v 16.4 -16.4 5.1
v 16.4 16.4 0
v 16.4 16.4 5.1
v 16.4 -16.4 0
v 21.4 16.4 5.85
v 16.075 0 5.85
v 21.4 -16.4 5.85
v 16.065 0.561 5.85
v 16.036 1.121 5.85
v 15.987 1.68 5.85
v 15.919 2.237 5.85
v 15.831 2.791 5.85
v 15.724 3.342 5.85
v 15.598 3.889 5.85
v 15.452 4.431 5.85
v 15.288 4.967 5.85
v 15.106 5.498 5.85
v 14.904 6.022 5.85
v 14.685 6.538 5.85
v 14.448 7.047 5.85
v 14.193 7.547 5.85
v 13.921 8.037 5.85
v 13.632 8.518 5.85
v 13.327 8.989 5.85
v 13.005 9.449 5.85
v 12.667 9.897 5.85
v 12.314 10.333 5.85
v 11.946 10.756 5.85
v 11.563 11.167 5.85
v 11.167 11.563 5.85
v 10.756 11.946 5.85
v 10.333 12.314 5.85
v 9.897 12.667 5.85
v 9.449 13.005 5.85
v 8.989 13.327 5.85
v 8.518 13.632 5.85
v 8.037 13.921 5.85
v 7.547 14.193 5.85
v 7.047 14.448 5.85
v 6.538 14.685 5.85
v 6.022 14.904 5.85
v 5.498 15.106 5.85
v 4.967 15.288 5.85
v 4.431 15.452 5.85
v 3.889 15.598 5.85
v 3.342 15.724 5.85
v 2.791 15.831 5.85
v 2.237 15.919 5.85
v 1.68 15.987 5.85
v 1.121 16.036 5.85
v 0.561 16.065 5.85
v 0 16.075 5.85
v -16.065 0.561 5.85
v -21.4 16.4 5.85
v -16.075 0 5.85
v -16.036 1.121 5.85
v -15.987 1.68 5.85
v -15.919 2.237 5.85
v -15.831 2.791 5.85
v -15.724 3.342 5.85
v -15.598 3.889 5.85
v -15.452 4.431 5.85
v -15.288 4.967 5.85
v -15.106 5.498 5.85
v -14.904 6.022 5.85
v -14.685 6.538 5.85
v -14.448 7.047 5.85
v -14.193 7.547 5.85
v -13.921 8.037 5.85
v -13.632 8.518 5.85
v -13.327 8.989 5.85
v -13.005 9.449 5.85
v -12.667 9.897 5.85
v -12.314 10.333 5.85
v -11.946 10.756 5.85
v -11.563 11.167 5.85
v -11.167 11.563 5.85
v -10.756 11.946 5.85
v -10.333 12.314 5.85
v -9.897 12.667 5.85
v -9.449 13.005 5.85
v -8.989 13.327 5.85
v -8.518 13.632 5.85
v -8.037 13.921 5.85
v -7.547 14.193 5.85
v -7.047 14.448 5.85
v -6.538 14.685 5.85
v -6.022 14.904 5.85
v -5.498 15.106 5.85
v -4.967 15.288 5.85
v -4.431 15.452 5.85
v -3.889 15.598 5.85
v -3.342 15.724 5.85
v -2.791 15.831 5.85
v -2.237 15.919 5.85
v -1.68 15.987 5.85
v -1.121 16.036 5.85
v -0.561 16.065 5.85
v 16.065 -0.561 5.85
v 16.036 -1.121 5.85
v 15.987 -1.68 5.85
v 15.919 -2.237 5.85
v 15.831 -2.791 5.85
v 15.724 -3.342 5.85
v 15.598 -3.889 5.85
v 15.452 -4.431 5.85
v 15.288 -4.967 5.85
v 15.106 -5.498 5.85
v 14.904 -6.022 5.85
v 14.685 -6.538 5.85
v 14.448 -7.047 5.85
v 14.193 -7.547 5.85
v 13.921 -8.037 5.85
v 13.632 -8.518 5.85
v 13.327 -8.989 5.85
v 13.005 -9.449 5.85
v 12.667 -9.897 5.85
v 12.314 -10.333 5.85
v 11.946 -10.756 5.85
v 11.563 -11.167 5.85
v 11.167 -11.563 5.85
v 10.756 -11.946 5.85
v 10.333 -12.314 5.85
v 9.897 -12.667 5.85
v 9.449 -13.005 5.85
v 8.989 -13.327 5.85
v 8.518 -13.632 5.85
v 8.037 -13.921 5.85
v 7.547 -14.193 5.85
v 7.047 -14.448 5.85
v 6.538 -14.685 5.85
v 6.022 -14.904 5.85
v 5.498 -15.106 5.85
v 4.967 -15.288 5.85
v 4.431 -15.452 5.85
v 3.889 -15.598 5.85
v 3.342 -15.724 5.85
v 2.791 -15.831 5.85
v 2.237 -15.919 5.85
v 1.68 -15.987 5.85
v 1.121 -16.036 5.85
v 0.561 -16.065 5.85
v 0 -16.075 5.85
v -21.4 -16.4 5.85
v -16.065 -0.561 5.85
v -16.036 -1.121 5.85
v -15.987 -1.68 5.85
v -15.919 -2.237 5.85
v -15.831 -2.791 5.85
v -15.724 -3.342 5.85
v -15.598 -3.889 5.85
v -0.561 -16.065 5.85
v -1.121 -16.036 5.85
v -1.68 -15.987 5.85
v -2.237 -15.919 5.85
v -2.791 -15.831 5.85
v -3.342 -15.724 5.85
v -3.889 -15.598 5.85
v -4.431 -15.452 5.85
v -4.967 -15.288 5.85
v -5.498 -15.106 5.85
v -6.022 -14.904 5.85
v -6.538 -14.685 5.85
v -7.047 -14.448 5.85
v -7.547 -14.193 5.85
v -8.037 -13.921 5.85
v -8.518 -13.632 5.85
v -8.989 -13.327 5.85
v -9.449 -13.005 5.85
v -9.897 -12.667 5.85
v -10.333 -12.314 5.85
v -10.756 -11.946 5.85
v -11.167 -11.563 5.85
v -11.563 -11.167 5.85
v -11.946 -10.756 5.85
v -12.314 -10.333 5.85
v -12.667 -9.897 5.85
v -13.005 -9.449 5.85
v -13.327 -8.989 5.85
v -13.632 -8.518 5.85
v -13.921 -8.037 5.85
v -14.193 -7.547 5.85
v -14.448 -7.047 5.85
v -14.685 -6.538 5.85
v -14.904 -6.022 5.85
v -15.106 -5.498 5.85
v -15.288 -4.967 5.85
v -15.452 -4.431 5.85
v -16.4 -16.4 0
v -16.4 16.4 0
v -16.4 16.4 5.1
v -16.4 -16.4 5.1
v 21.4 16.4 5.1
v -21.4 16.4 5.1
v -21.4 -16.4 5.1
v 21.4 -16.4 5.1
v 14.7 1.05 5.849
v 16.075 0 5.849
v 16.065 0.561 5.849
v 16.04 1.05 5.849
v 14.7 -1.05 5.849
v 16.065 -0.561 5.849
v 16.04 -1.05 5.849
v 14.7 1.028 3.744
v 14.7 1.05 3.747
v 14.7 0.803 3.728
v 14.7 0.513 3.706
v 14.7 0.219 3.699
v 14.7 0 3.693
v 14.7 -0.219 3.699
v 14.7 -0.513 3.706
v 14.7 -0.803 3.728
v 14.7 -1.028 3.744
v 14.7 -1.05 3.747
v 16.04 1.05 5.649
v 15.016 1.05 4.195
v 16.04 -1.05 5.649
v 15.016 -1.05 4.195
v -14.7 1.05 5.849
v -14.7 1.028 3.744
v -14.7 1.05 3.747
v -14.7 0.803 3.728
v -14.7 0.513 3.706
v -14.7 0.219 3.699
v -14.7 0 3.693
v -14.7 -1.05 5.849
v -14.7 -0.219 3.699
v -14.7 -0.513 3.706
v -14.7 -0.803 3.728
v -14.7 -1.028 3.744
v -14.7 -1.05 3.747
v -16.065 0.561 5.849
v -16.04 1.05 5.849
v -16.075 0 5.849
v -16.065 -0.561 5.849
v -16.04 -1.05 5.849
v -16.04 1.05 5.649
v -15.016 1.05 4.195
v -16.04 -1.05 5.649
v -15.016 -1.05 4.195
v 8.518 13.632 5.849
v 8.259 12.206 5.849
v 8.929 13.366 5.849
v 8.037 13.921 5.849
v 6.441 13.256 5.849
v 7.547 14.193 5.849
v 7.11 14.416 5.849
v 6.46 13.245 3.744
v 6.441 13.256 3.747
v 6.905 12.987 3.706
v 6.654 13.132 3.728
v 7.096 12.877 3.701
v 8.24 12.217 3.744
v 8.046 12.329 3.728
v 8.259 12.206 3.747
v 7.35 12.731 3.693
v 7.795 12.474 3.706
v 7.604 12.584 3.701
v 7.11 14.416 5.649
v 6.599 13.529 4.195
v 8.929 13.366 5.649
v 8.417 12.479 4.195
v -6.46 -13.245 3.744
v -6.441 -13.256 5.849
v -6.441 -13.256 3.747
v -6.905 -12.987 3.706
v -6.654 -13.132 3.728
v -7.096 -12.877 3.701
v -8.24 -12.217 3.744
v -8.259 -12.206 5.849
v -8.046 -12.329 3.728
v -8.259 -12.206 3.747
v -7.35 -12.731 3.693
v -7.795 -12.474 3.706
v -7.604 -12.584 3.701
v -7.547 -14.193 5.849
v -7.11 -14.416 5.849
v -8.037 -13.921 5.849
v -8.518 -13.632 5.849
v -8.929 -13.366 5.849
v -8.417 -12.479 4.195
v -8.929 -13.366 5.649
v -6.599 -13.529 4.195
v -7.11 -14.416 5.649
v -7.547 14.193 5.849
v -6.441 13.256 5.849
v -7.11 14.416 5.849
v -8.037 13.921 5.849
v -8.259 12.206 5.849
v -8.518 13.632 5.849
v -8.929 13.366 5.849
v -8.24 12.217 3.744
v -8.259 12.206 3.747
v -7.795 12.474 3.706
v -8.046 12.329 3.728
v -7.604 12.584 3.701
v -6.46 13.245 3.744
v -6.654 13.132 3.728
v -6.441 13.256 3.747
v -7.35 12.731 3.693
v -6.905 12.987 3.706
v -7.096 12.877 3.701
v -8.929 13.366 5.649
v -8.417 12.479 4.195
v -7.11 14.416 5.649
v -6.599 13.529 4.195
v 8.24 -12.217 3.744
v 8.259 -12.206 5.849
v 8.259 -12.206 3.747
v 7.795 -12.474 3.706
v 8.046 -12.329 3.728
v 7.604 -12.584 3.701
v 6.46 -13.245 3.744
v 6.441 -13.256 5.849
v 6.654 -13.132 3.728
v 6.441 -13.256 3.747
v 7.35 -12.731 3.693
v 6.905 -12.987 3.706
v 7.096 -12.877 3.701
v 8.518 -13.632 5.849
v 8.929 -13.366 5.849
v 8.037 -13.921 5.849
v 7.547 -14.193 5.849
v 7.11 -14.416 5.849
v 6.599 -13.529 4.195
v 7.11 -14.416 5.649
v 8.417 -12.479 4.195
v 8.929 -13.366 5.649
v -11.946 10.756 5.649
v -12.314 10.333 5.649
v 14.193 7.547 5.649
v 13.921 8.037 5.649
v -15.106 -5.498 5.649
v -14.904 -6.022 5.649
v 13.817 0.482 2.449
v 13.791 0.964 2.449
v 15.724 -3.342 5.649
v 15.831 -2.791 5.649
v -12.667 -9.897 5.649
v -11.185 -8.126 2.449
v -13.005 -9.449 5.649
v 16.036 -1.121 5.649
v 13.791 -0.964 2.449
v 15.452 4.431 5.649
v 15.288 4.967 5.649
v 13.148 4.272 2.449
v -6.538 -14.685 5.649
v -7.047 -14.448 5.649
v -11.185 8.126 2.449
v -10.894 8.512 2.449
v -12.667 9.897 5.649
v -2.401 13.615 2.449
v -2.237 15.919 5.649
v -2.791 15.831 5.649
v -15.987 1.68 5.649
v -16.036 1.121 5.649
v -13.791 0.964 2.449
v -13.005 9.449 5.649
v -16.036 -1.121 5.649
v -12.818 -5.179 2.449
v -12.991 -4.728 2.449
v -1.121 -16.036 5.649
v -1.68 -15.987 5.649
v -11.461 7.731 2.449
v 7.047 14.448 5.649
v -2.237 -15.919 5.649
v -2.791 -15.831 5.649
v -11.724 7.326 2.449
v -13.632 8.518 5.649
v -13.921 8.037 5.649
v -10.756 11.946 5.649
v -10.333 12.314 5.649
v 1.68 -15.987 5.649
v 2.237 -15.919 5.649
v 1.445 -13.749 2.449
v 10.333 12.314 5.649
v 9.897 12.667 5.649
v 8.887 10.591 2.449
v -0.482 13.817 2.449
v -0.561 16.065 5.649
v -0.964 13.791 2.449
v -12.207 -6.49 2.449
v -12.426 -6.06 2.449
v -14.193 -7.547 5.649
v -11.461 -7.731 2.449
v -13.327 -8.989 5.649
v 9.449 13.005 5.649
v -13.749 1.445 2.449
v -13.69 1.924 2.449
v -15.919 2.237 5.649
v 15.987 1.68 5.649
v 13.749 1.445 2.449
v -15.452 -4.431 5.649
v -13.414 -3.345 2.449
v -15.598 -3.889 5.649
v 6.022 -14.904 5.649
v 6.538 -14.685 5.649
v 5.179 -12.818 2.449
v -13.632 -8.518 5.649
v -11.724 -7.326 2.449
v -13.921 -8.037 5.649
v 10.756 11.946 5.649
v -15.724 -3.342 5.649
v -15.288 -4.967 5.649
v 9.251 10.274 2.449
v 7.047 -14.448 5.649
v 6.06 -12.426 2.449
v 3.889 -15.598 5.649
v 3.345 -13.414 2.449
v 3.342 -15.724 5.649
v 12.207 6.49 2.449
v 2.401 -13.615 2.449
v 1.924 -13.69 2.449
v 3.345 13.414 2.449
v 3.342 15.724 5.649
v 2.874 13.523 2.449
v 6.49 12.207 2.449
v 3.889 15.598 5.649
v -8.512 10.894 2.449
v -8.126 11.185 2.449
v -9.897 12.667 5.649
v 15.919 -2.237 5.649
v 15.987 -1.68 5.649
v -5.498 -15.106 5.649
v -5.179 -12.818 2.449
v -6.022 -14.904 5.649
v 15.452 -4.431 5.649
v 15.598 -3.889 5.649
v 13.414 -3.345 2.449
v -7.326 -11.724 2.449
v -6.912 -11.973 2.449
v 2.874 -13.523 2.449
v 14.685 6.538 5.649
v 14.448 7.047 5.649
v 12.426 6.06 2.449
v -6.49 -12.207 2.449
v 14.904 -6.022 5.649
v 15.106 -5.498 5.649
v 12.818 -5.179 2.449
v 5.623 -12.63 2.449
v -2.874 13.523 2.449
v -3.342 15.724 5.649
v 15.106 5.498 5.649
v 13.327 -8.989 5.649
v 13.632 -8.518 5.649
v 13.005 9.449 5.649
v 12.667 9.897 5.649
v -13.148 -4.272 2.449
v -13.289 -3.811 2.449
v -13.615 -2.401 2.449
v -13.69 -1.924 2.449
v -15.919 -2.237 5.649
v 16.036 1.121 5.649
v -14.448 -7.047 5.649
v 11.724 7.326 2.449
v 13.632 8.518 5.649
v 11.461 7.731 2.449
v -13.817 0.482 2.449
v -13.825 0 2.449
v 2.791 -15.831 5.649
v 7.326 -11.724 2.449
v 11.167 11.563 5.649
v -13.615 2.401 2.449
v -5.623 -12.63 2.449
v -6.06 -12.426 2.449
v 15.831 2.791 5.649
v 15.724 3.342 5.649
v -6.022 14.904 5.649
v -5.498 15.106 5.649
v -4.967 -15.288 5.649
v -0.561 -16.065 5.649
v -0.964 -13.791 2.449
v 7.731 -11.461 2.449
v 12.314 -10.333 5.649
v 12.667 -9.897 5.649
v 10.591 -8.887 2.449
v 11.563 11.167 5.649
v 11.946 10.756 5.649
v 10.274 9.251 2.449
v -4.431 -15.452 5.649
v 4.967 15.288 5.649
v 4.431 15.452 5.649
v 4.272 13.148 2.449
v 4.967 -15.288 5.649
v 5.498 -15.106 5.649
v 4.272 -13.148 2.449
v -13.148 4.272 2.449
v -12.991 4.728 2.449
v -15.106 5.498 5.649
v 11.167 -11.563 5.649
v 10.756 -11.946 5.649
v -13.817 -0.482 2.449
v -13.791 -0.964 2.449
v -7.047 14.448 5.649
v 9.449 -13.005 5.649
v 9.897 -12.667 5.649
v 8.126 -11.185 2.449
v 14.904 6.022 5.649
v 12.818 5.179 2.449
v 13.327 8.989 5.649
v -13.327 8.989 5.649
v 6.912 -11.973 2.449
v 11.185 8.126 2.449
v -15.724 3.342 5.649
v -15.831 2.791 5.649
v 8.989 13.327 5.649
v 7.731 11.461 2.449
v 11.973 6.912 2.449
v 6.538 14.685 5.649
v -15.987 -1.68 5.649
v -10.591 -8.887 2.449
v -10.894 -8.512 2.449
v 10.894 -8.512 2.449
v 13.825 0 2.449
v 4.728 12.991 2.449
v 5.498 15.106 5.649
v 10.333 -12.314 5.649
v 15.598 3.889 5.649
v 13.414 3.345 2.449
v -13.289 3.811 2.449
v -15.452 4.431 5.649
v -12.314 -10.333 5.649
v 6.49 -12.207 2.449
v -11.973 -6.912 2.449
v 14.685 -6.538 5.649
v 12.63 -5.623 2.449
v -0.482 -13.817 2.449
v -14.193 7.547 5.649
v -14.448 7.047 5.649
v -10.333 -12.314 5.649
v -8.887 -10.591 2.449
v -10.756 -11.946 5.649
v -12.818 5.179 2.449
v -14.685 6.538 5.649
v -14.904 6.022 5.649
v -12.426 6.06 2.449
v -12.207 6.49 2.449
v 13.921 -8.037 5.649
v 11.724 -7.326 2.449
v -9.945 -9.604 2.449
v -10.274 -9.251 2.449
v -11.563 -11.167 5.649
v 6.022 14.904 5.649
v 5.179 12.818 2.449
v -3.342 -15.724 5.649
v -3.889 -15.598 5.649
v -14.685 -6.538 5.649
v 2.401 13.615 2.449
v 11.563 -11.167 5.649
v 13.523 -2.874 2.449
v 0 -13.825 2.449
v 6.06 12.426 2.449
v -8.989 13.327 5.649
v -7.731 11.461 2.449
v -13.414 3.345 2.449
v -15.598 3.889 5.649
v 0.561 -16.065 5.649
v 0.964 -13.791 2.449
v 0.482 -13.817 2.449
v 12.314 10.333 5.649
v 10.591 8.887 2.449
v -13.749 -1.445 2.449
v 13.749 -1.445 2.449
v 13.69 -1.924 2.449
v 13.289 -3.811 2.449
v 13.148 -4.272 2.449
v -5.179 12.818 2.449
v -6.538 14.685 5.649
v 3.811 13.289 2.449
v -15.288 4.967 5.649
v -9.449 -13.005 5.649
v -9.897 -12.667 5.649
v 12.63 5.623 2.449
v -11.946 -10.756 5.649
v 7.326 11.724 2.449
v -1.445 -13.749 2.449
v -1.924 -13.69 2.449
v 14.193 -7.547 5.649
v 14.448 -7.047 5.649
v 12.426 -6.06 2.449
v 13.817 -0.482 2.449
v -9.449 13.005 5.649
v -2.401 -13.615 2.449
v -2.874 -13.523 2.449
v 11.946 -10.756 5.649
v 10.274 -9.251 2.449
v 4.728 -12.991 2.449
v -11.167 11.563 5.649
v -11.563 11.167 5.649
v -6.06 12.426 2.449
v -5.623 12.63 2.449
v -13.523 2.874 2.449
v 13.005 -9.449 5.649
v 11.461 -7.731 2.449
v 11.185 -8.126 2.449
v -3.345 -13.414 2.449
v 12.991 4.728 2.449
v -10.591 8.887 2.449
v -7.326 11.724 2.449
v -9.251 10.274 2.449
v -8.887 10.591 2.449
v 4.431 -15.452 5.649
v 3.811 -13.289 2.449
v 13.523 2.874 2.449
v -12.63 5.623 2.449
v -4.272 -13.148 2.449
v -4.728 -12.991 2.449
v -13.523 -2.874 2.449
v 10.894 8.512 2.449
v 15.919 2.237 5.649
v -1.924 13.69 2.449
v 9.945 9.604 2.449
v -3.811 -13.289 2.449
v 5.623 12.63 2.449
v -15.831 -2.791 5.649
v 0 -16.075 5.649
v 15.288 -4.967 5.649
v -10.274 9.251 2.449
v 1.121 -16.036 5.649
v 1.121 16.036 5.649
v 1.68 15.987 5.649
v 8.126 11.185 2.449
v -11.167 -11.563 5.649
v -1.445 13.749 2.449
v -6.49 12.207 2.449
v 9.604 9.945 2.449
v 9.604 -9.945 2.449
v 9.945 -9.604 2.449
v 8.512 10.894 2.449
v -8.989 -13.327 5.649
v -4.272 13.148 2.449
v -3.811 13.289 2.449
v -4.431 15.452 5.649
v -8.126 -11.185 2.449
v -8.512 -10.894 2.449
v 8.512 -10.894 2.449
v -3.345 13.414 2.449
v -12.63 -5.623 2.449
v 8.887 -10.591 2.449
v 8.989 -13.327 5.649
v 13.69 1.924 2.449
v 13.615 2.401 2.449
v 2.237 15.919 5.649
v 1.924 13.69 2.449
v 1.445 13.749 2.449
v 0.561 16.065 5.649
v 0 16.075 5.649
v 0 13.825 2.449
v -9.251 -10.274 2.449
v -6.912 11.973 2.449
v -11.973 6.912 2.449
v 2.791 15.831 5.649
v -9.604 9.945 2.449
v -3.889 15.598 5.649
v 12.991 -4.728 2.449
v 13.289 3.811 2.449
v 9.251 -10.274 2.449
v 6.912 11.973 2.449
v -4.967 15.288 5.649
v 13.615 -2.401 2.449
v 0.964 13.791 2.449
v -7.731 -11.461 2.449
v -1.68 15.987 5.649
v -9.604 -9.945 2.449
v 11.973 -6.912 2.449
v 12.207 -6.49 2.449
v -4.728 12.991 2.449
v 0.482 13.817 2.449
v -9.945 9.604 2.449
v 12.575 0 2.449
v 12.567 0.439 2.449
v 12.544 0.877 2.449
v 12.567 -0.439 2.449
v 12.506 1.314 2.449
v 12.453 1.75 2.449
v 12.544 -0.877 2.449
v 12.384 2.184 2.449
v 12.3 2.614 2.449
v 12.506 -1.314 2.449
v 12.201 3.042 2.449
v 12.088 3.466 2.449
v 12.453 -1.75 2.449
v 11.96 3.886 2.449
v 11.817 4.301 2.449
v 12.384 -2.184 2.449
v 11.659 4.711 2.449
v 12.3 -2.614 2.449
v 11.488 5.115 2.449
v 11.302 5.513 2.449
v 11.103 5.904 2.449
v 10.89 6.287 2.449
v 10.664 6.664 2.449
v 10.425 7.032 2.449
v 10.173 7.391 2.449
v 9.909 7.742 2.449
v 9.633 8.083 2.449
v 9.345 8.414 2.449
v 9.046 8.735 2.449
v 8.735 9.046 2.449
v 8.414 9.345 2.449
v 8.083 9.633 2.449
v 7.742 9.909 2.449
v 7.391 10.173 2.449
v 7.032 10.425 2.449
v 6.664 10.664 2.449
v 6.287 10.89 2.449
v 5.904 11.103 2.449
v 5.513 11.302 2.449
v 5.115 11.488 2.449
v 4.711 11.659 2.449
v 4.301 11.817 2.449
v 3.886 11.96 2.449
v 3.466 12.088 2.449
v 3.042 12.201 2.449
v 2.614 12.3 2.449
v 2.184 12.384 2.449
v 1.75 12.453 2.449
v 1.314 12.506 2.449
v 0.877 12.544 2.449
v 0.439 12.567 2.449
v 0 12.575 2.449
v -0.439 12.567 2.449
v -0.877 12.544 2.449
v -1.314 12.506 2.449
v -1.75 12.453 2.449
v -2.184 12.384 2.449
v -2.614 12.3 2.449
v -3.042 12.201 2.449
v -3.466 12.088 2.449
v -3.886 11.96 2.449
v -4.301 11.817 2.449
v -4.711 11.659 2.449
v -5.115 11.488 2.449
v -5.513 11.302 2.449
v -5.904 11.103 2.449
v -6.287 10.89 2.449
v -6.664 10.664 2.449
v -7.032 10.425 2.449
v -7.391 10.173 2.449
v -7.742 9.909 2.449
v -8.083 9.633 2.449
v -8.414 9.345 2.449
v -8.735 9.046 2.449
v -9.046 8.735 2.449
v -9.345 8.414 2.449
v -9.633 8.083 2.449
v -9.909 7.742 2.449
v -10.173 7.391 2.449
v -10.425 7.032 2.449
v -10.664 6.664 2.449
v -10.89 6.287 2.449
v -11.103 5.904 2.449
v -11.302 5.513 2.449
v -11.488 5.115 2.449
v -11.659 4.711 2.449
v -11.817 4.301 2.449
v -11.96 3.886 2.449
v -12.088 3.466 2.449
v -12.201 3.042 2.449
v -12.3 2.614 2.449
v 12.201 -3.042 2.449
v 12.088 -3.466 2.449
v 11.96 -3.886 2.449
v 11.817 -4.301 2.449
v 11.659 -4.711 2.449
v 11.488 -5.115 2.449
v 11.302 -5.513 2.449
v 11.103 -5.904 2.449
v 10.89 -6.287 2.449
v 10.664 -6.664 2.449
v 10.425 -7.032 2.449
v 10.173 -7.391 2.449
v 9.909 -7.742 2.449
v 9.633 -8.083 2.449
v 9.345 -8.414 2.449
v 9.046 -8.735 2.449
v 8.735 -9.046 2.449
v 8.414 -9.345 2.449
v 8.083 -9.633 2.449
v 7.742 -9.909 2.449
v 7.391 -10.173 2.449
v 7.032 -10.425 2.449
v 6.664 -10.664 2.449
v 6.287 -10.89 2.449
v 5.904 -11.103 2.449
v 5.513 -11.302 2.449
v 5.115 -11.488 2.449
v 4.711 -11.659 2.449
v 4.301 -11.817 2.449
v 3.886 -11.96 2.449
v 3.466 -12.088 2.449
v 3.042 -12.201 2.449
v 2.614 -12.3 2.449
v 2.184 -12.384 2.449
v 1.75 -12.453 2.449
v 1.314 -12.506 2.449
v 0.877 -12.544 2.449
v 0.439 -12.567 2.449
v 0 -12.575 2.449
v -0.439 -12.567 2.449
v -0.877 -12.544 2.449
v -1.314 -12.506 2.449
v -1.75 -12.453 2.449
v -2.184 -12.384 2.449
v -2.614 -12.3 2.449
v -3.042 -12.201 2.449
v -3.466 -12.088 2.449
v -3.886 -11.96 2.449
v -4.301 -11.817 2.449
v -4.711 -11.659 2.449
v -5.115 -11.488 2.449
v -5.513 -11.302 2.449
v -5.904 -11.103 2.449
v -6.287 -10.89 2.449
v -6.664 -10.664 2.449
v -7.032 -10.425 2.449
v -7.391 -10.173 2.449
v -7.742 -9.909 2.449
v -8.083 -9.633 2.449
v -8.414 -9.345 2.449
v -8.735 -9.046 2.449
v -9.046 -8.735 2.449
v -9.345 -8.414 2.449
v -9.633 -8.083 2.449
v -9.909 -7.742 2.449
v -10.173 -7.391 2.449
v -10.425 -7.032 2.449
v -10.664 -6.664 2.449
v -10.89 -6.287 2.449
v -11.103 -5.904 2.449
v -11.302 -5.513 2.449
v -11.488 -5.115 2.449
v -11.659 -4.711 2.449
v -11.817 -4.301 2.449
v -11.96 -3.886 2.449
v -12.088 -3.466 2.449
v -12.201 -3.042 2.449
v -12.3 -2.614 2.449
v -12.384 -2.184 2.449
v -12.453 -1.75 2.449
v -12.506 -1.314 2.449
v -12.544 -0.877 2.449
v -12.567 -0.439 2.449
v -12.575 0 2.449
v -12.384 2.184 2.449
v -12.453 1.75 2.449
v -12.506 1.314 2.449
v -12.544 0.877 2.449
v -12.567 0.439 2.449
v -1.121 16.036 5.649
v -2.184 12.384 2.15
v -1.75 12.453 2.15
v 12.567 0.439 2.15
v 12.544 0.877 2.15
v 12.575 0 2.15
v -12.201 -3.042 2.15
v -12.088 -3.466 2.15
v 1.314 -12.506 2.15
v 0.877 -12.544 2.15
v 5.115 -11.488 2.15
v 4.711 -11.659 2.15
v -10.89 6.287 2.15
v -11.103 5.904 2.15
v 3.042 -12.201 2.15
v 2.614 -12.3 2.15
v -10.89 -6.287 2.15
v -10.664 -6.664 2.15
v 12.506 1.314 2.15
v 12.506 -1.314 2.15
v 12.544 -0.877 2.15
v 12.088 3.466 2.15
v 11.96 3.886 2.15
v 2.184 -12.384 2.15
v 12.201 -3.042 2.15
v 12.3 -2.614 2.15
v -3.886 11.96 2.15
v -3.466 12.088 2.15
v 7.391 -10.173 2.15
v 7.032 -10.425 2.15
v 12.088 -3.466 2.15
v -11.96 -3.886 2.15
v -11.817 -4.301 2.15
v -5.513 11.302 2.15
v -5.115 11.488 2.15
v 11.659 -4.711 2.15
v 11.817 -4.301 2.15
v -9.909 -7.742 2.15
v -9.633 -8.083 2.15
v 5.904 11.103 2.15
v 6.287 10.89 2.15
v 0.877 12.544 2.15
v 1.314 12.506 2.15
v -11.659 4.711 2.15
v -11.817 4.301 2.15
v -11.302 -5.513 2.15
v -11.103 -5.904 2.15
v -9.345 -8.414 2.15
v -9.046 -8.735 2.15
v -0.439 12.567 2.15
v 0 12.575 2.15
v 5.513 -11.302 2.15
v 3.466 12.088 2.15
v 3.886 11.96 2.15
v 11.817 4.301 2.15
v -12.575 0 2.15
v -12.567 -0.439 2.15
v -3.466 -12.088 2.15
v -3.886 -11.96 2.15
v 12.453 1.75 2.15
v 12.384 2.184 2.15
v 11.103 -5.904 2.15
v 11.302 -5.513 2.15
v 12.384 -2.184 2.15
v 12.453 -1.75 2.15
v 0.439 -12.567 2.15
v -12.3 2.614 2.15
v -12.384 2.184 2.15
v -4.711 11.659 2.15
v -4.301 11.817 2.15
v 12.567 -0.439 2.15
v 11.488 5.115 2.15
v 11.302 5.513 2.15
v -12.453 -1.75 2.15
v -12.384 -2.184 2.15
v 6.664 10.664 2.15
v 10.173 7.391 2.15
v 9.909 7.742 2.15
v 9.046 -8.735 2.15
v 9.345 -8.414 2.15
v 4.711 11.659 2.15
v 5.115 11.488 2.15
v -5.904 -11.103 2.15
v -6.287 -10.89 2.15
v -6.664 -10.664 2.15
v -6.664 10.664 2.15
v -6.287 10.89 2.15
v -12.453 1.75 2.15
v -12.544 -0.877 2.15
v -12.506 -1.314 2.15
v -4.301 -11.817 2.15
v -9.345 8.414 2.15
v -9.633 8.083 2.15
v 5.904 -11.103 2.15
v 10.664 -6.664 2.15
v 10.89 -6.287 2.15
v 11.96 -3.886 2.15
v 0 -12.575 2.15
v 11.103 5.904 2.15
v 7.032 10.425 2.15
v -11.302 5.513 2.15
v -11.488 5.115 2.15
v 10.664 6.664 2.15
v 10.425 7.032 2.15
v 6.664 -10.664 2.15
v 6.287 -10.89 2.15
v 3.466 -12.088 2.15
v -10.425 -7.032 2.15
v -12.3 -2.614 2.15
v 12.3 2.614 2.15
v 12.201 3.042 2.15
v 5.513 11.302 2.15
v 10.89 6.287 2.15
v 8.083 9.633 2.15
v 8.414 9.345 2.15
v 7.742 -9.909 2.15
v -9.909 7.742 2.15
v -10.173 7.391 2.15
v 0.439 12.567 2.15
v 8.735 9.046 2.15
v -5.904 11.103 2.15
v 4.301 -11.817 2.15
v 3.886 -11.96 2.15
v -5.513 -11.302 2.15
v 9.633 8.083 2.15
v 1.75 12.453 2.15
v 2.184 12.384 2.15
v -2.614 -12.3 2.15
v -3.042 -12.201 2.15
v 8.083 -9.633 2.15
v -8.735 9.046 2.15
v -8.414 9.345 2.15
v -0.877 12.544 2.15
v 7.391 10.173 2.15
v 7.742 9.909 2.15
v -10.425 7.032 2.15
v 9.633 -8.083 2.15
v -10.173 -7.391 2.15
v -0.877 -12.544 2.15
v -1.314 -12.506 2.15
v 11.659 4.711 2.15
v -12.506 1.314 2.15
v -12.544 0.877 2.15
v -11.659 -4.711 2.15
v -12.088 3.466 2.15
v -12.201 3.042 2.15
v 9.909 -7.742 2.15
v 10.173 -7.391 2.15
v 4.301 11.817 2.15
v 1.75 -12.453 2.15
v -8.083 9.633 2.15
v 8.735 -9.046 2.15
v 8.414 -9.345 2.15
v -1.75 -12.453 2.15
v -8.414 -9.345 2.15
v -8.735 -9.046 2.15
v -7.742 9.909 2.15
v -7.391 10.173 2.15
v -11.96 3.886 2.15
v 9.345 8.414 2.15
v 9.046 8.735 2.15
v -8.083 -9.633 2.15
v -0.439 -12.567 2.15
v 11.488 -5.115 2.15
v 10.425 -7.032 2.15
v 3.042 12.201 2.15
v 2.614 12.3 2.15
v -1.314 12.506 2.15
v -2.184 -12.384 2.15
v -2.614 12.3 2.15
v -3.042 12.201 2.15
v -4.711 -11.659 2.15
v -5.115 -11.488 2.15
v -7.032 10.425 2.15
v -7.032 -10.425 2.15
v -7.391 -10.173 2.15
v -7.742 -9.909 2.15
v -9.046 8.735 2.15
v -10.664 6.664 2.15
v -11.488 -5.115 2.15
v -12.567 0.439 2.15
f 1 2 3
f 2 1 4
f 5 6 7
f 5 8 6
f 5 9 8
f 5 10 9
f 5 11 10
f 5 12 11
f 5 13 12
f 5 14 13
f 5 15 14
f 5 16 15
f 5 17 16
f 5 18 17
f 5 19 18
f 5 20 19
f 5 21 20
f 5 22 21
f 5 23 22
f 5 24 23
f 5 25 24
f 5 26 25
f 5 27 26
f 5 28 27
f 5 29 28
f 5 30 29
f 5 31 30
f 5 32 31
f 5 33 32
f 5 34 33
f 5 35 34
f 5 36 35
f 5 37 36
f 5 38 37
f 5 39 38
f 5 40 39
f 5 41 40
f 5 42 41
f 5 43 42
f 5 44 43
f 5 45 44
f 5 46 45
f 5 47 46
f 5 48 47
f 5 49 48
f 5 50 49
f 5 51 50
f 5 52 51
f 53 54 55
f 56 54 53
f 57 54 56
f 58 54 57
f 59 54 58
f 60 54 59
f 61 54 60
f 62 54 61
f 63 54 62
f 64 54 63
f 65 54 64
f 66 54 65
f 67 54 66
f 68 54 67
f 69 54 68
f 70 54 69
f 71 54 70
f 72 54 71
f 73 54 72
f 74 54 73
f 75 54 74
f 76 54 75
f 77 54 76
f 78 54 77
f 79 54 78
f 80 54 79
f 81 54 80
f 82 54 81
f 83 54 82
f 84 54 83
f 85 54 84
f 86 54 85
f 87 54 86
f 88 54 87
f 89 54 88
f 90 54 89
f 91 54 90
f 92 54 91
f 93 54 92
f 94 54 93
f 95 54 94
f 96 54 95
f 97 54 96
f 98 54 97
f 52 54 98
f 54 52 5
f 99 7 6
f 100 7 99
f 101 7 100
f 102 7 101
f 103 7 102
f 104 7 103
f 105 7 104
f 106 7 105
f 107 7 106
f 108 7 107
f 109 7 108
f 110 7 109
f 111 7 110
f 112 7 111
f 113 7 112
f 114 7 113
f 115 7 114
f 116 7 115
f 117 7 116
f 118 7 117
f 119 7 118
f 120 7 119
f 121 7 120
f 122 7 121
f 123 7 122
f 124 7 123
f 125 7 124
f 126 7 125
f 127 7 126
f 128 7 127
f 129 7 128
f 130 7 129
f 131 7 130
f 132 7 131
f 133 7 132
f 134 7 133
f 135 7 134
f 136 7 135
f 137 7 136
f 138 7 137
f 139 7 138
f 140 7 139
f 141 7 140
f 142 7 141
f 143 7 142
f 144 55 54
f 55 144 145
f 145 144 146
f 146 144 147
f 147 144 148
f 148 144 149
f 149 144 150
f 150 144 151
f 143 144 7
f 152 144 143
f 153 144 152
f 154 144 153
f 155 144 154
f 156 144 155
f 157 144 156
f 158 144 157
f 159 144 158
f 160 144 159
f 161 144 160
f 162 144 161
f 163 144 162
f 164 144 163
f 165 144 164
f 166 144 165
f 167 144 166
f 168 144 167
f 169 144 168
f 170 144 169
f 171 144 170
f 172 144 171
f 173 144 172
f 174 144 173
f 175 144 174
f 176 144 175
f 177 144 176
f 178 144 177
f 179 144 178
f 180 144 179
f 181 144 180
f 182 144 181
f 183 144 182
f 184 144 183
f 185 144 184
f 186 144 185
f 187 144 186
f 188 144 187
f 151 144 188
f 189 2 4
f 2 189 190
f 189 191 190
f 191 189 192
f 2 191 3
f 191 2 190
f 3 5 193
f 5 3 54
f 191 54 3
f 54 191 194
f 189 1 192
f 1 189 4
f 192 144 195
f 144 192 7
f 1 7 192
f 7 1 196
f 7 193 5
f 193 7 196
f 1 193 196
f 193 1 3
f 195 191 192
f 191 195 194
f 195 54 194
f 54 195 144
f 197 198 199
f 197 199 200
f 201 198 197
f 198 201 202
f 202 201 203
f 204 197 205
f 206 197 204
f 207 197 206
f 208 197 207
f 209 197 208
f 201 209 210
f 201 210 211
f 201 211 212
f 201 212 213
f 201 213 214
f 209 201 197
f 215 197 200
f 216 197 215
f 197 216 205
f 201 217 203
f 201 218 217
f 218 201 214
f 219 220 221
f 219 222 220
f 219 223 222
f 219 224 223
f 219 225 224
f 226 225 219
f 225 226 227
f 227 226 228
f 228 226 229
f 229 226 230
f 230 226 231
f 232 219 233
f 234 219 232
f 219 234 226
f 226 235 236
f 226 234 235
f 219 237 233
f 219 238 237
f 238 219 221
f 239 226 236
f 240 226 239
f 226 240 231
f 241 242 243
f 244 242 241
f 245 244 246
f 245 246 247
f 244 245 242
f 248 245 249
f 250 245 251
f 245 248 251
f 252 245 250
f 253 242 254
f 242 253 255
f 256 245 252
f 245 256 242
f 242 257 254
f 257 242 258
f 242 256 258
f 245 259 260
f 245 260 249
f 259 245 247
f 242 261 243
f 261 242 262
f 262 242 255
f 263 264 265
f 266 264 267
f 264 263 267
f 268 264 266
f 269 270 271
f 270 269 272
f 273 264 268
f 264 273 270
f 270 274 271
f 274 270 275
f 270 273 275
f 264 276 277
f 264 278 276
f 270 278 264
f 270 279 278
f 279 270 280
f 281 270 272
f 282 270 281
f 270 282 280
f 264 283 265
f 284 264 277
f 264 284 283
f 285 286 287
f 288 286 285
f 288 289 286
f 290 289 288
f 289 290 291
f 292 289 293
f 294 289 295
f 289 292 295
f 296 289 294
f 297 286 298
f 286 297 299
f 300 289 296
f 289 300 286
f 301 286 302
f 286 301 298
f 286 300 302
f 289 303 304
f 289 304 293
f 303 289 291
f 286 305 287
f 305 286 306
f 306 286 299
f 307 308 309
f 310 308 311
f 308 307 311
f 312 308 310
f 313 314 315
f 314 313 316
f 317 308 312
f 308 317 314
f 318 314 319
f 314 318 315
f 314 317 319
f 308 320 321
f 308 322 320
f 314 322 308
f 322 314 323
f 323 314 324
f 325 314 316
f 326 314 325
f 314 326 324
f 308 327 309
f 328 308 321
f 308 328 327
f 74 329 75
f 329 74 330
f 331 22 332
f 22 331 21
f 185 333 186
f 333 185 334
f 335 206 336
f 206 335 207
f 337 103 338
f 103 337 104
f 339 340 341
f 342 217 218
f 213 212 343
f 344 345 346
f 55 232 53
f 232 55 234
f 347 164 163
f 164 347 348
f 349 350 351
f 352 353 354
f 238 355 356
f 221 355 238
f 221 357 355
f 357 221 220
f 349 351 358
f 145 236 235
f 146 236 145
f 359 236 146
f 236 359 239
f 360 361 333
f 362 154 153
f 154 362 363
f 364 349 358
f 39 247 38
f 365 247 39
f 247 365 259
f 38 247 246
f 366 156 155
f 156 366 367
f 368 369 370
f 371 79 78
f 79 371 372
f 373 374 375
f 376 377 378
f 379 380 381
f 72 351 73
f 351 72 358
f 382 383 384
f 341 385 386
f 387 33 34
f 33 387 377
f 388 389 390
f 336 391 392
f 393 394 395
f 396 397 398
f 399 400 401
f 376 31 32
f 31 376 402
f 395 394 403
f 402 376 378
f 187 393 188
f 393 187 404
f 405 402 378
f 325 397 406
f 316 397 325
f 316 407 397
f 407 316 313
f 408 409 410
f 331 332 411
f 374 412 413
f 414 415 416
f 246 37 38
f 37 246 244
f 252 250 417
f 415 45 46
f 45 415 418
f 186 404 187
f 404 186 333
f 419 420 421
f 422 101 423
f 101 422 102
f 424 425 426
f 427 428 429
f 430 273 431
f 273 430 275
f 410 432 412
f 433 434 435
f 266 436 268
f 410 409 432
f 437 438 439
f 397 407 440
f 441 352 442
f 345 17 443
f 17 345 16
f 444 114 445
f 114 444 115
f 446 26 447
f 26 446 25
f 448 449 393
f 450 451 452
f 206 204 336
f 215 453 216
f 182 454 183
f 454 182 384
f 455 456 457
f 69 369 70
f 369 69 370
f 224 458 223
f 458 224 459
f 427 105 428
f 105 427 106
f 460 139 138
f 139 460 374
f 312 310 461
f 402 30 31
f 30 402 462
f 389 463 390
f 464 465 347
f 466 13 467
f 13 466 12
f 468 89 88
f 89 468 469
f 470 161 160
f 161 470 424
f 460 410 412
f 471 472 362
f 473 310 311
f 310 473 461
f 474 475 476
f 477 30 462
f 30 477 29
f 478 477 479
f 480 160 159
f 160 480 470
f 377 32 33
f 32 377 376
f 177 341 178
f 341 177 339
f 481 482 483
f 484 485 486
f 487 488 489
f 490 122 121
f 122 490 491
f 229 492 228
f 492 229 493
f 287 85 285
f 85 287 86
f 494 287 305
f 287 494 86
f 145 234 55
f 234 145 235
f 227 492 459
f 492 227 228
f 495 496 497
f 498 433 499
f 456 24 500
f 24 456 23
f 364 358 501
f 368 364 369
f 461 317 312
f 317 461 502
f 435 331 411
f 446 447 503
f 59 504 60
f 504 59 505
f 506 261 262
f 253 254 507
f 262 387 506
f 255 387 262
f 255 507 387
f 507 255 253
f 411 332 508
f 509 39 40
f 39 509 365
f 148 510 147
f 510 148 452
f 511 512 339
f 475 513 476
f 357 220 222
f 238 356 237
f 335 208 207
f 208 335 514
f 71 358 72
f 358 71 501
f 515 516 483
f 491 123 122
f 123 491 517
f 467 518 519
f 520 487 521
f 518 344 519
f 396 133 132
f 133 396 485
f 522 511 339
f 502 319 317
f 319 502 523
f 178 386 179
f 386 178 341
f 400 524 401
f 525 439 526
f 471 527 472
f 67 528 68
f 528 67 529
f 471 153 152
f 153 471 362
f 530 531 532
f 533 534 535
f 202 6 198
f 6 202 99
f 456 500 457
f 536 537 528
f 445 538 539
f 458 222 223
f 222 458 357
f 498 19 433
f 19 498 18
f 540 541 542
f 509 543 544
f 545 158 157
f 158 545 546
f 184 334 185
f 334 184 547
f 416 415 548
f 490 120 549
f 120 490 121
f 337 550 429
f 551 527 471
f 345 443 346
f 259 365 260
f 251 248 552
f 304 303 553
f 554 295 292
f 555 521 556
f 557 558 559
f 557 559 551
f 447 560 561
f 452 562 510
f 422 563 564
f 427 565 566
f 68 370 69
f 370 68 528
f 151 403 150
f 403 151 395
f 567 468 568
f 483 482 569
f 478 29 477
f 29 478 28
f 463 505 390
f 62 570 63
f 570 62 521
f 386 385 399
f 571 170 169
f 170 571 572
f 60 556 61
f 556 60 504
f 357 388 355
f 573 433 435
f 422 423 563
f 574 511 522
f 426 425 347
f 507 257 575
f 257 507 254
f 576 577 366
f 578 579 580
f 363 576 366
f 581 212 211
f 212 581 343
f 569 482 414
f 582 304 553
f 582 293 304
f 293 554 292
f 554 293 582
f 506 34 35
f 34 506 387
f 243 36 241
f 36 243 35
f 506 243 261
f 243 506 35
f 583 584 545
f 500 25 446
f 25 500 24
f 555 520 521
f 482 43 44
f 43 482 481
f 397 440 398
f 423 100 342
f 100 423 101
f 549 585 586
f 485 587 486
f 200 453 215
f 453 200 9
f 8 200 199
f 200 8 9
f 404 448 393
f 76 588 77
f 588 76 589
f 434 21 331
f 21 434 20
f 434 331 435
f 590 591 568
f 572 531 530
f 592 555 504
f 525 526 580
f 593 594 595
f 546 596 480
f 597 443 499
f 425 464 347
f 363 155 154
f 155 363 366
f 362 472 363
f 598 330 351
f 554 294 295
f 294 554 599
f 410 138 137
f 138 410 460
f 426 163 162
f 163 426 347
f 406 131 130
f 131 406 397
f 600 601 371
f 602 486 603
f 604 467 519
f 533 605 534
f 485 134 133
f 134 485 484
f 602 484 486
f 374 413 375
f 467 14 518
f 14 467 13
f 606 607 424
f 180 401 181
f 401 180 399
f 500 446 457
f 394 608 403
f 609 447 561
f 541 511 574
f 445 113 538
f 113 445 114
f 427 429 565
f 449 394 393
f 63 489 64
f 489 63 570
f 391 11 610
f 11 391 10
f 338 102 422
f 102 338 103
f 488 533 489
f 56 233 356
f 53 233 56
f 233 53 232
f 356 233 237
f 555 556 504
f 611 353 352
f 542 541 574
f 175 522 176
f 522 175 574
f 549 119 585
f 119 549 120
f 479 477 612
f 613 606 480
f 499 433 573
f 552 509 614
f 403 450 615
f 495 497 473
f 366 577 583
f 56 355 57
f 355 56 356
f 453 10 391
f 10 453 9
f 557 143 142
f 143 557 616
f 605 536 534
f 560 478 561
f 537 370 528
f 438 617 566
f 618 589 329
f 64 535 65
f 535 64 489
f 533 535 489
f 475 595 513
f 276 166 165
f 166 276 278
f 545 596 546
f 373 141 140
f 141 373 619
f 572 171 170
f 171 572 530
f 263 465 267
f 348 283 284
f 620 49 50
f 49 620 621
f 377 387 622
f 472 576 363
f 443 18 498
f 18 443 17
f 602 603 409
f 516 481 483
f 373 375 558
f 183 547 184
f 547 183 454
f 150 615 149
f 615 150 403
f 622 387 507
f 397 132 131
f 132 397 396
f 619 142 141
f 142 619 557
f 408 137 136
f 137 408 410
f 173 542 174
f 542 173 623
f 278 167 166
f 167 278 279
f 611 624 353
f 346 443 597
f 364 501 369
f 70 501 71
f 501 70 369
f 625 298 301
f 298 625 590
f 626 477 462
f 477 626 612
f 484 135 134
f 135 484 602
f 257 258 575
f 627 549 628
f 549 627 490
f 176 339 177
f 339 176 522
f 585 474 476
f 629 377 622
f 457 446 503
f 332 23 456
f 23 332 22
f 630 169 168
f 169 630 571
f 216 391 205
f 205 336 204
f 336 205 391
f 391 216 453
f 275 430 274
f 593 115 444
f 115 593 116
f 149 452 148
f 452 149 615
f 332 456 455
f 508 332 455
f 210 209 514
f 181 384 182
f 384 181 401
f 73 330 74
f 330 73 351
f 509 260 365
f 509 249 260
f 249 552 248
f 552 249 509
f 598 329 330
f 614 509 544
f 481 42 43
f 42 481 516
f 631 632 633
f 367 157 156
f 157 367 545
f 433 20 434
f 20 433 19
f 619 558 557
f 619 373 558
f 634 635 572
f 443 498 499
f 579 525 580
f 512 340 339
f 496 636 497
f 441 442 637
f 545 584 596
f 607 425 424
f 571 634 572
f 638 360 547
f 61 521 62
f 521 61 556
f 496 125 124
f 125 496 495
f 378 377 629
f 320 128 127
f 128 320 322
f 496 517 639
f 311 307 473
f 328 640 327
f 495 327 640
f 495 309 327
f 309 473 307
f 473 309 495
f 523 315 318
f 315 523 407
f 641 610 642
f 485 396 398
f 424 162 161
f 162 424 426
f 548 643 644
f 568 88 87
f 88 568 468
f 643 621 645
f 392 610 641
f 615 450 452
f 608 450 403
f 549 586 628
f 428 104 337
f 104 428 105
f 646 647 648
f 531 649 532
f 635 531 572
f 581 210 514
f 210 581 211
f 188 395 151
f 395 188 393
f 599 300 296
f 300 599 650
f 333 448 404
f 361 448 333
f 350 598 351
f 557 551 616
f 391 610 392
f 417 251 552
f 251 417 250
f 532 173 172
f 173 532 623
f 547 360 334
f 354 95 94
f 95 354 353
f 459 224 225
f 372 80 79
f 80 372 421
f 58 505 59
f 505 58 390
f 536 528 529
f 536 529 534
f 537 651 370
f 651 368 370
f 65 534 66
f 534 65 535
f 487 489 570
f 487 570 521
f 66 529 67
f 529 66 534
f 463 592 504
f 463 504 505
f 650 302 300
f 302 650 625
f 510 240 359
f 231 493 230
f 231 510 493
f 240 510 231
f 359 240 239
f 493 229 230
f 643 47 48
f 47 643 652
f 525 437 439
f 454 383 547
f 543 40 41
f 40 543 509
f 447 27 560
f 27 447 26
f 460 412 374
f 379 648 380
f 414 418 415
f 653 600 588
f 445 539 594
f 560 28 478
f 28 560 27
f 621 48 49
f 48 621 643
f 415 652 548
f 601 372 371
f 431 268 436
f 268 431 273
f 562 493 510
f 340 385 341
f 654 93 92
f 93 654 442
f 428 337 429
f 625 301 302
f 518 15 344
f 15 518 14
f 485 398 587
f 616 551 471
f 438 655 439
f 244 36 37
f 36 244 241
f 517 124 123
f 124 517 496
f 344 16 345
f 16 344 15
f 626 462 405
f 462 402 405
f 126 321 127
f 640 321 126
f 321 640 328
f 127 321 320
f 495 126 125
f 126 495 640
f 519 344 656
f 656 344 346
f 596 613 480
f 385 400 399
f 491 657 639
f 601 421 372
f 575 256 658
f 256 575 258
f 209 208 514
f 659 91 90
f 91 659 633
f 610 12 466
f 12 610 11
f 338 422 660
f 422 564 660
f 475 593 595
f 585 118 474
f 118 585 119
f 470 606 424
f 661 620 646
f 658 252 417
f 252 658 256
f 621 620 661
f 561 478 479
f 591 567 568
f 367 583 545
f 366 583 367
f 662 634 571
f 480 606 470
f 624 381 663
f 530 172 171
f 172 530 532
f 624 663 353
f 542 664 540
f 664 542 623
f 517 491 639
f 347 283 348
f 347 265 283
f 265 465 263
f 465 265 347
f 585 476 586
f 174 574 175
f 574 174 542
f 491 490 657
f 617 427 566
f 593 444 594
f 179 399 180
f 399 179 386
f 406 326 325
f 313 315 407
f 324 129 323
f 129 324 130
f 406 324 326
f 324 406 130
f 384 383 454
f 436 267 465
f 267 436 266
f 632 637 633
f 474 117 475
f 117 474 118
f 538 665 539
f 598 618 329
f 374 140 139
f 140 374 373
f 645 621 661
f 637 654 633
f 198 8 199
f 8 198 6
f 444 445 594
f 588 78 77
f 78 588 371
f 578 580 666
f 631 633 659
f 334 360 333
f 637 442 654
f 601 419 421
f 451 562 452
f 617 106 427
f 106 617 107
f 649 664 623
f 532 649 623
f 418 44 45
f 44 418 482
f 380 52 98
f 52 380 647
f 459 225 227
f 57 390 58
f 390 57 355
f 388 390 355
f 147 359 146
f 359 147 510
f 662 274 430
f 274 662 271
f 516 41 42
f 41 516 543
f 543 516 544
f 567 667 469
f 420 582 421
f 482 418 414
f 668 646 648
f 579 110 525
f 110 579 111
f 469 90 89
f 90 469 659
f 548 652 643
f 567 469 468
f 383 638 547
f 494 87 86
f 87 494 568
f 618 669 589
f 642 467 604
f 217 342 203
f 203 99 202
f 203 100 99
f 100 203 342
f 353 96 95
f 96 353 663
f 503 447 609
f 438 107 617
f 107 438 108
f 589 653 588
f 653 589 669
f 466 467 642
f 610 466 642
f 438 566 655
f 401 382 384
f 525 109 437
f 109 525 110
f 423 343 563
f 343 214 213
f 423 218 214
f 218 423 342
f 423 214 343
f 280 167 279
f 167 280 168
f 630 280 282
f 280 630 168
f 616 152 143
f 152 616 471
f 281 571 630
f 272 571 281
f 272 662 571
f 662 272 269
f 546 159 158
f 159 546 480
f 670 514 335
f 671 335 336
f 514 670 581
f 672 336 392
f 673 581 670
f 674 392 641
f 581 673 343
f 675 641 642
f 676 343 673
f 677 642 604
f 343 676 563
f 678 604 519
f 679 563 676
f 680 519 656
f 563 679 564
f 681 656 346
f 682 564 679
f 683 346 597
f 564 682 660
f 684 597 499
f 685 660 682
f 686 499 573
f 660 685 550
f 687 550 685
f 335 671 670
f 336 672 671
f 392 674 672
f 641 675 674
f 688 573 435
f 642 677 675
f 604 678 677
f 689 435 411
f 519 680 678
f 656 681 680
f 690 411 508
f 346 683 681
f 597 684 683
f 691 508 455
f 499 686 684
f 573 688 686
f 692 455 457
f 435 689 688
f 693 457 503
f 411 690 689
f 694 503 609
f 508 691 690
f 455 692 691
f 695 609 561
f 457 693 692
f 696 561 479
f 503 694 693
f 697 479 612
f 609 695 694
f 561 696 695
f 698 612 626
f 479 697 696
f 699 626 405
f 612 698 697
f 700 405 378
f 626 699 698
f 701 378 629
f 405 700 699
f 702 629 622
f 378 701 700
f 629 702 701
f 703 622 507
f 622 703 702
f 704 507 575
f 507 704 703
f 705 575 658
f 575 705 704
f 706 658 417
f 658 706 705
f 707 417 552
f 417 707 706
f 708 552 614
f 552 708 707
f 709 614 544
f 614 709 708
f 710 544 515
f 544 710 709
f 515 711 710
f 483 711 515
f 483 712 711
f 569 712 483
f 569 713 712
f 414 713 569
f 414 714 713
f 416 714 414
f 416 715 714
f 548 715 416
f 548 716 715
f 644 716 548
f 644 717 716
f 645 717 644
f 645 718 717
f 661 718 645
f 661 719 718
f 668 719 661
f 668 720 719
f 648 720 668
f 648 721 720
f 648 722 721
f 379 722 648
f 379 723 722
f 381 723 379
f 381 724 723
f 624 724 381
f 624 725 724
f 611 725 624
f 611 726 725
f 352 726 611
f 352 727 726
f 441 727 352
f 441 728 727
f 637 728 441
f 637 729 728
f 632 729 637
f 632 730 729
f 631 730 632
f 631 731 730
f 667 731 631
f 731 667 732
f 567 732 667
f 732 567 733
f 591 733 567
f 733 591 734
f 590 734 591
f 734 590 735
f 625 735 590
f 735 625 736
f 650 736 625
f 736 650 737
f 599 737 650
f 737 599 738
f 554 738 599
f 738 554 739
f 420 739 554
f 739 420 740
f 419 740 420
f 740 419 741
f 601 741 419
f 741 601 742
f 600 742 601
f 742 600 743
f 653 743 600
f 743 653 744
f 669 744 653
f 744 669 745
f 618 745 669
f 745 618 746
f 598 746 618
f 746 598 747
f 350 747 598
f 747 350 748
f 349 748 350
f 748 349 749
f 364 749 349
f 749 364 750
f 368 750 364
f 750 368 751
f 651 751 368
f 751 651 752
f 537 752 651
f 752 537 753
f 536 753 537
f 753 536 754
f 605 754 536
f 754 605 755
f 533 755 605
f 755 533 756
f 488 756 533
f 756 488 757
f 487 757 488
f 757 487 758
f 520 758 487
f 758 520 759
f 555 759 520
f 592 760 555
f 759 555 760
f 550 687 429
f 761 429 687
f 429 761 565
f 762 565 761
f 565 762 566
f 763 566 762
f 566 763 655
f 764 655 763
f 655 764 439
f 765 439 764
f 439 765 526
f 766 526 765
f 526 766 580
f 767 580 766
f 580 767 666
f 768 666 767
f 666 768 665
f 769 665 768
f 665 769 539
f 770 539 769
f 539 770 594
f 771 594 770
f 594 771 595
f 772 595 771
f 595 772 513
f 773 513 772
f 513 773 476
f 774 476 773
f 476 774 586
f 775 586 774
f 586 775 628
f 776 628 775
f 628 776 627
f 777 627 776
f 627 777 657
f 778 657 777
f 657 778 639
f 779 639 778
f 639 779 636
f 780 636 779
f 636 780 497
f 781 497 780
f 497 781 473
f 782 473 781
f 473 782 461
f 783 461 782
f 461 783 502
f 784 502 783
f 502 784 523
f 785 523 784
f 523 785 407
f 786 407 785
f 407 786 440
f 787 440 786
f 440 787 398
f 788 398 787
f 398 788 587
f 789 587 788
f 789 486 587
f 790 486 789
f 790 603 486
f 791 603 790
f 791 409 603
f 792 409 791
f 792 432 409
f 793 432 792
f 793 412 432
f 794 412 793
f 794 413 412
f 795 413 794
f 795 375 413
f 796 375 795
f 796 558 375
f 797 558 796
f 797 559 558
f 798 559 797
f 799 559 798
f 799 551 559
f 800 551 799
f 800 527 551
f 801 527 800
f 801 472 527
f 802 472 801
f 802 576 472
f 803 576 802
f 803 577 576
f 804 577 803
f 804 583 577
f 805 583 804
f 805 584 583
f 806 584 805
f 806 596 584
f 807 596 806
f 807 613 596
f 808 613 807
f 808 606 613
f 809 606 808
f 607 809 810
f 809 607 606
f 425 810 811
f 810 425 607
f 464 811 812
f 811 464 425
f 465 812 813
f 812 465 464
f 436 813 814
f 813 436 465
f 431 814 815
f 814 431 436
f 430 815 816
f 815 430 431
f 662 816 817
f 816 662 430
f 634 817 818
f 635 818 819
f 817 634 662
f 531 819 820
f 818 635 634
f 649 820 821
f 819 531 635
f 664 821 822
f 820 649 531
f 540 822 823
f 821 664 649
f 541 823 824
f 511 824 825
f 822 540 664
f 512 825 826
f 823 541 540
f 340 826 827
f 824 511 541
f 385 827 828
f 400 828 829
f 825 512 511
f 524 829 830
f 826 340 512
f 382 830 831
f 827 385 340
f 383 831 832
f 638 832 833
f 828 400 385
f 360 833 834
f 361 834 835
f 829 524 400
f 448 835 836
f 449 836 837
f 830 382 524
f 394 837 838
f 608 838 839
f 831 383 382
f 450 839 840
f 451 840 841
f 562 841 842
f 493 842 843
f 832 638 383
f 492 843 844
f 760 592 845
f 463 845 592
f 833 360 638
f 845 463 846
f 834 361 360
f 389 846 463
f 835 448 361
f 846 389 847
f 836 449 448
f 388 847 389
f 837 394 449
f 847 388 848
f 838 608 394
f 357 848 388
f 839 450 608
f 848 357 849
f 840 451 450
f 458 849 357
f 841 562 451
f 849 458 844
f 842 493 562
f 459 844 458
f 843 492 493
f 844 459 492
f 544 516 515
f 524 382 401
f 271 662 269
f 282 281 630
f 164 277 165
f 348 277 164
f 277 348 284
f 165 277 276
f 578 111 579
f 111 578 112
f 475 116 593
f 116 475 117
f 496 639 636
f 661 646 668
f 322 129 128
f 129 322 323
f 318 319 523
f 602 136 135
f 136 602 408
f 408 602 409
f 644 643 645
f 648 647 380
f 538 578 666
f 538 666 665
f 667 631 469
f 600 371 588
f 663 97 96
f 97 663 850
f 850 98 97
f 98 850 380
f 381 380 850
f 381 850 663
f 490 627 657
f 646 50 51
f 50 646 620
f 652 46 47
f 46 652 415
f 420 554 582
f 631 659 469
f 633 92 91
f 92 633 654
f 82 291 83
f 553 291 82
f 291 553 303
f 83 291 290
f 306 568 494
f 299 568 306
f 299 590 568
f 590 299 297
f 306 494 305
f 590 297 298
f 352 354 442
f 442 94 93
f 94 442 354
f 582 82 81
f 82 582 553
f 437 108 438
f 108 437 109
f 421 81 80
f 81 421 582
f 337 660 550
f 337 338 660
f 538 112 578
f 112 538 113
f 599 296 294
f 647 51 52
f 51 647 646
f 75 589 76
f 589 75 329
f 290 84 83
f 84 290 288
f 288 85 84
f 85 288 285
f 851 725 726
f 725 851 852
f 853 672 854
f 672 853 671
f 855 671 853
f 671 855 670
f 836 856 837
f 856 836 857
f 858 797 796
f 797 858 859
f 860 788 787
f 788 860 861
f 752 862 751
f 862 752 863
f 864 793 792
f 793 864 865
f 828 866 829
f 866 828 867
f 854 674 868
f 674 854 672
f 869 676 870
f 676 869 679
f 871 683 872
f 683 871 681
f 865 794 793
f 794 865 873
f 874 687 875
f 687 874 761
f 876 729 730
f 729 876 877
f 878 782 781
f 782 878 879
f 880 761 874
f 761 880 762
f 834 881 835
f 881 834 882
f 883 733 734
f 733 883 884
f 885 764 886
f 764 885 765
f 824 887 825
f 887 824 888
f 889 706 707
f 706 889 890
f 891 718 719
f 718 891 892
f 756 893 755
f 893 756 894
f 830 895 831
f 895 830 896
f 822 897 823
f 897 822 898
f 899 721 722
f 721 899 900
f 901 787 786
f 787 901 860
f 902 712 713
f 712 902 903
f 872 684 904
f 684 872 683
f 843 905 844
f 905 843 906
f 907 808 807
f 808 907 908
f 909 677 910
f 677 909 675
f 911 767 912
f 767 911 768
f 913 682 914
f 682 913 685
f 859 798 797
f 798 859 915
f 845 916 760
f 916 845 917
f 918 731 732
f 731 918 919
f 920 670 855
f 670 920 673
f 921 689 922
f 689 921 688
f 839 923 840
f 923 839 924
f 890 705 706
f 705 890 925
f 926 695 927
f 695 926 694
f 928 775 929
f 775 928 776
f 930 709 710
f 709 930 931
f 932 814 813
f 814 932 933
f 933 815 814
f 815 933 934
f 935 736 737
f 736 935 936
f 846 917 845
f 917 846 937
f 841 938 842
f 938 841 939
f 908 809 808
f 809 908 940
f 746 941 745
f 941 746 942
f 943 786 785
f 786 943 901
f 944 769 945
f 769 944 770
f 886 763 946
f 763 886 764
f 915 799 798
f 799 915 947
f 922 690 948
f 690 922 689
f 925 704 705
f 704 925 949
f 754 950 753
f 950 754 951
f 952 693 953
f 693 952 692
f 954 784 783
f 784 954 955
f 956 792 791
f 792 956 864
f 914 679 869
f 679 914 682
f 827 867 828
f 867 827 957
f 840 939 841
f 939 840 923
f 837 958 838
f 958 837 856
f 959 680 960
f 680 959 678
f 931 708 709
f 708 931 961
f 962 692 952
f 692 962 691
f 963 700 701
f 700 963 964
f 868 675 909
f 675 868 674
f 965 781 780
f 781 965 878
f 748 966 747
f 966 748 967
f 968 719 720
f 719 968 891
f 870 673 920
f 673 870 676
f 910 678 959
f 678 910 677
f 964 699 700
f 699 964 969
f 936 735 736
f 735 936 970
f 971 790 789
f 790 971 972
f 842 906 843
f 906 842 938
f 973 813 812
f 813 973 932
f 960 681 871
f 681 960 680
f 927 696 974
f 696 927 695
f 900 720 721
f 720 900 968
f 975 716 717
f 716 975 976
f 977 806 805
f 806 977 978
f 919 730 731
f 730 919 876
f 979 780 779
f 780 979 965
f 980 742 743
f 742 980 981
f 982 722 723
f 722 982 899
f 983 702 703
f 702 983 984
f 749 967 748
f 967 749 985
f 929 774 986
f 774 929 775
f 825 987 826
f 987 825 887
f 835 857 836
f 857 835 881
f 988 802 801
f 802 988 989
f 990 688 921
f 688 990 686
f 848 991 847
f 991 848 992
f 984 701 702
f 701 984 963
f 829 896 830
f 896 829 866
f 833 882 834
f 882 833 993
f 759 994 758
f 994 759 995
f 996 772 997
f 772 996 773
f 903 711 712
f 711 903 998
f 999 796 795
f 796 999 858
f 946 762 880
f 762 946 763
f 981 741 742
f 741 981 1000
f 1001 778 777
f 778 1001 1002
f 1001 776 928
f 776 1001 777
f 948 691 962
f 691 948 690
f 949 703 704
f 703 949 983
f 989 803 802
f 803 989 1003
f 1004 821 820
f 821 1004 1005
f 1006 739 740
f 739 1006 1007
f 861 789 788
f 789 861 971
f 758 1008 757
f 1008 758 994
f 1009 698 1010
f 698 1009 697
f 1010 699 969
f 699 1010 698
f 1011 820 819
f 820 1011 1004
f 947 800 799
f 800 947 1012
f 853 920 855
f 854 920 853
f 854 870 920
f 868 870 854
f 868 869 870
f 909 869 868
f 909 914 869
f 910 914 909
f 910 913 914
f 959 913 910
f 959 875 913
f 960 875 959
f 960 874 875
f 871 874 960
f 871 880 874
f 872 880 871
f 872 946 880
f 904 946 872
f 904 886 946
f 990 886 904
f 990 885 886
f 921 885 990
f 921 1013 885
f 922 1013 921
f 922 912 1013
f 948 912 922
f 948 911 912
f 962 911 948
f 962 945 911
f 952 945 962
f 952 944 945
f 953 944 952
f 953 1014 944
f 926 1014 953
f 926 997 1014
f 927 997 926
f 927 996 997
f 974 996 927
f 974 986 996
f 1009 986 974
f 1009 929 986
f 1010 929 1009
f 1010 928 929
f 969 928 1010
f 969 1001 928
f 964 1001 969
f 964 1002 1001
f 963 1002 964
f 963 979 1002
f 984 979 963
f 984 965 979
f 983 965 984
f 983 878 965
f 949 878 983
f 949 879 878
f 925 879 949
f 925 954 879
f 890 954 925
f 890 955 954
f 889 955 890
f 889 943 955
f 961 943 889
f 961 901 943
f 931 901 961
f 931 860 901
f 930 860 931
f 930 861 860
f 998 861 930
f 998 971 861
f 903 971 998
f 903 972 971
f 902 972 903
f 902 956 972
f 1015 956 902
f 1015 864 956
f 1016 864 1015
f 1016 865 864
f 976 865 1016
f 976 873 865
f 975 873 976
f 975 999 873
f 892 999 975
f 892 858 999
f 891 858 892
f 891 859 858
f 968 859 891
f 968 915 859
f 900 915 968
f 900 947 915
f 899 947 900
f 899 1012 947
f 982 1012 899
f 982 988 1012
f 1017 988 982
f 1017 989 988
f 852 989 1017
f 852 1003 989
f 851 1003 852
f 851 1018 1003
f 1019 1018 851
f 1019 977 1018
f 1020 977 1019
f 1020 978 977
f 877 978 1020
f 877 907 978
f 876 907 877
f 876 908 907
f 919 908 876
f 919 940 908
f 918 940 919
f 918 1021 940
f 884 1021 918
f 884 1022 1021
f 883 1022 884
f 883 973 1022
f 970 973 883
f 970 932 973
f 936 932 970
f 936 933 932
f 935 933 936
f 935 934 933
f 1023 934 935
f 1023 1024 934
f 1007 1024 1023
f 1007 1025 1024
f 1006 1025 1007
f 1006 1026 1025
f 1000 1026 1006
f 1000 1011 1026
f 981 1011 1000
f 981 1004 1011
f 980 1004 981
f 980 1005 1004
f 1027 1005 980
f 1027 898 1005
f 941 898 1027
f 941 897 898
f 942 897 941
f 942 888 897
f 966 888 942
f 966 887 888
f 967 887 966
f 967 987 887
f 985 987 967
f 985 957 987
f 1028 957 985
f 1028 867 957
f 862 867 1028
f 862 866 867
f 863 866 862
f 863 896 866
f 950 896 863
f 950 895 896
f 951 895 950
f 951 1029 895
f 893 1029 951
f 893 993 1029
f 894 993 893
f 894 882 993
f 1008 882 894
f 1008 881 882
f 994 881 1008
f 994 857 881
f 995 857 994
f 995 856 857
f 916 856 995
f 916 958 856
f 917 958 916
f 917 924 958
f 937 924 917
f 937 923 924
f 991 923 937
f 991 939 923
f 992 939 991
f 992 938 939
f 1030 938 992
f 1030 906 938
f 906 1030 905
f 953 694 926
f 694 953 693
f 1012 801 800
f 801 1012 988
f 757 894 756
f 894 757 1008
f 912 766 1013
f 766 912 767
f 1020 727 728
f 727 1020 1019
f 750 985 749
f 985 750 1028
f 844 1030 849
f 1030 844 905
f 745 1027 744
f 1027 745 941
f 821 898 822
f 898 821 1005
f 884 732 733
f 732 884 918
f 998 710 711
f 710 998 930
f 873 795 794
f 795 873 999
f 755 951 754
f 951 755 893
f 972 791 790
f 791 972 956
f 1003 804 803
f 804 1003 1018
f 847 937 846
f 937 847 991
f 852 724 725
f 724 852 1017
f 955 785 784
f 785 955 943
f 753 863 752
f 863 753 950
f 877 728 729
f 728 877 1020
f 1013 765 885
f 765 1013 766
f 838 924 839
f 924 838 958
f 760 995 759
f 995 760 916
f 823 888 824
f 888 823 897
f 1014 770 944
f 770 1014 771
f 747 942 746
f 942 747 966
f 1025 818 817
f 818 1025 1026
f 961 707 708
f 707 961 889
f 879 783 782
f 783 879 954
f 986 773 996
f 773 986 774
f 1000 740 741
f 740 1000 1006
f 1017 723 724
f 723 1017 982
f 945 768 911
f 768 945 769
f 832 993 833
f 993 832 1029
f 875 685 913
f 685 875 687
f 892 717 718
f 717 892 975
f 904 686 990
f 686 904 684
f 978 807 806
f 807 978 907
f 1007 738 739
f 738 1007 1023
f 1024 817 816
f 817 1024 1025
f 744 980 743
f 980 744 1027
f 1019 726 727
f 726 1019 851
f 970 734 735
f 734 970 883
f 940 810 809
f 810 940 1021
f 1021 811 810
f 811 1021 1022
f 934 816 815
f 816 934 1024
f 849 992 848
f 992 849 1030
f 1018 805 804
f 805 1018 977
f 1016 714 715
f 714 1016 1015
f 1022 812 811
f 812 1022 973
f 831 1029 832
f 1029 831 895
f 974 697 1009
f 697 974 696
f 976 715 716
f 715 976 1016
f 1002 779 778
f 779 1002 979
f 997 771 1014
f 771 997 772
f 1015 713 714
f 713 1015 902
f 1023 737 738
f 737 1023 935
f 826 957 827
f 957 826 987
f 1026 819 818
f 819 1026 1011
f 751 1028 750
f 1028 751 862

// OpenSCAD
// Tool to unscrew bottom wristwatch Seiko 
// v1 fits badly
// v2 changed notches and make it fit in the bench vise

// measurements
d1=25;    // center glass piece
h1=0.3;
d2=27.5;    // guessing metal rim is 2mm smaller
d3=29.4;  // notches
wn=2.1;
d4=32;    // max D of the back cover
h2=3.4;   // notches bottom to center glass piece
h3=3.7;   // total height of backplate

// printer
l1=0.2;
ln=0.15;
nozzle=0.4;

$fn=180;

module two_notches(
    d=d3, // v4: from d3-0.4 to just d3
    nw=wn, 
    nd=(d4-d3+0.4)/2+0.4, 
    h=h2) {
  translate([d/2,-nw/2,0]) cube([nd,nw,h]);
  translate([-d/2-nd,-nw/2,0]) cube([nd,nw,h]);
}


module back_plate() {
  cylinder (d=d1+0.15,h=h1+0.002);
  translate([0,0,h1-0.001]) 
    difference() {
      hull() {
        cylinder(d=d2+0.15,h=1);
        translate([0,0,h3-0.5]) 
          cylinder(d=d4+0.15,h=0.5);
      }
      two_notches();
      rotate(a=60) two_notches();
      rotate(a=120) two_notches();    
    }
  
}
*rotate([180,0,0]) back_plate();

difference() {
  body=l1+ln*3+ln*10; // give body to material
  union() {
    dt=d4+nozzle*2;
    ht=h3+body;
    translate([-dt/2,-dt/2,0])
      cube([dt,dt,ht]);
    translate([-dt/2-5,-dt/2,ht-ln*5])
      cube([dt+10,dt,ln*5]);
    *cylinder(d=dt,h=ht);
    *for(i=[0:20:360]) {
      rotate([0,0,i]) 
      translate([dt/2,0,0]) 
      scale([1,2,1]) 
      cylinder(d=3,h=ht);
    }
  }
  translate([0,0,body])back_plate();
  // debug
  *translate([0,0,-0.1]) cube([d4,d4,h2+1]);
}
